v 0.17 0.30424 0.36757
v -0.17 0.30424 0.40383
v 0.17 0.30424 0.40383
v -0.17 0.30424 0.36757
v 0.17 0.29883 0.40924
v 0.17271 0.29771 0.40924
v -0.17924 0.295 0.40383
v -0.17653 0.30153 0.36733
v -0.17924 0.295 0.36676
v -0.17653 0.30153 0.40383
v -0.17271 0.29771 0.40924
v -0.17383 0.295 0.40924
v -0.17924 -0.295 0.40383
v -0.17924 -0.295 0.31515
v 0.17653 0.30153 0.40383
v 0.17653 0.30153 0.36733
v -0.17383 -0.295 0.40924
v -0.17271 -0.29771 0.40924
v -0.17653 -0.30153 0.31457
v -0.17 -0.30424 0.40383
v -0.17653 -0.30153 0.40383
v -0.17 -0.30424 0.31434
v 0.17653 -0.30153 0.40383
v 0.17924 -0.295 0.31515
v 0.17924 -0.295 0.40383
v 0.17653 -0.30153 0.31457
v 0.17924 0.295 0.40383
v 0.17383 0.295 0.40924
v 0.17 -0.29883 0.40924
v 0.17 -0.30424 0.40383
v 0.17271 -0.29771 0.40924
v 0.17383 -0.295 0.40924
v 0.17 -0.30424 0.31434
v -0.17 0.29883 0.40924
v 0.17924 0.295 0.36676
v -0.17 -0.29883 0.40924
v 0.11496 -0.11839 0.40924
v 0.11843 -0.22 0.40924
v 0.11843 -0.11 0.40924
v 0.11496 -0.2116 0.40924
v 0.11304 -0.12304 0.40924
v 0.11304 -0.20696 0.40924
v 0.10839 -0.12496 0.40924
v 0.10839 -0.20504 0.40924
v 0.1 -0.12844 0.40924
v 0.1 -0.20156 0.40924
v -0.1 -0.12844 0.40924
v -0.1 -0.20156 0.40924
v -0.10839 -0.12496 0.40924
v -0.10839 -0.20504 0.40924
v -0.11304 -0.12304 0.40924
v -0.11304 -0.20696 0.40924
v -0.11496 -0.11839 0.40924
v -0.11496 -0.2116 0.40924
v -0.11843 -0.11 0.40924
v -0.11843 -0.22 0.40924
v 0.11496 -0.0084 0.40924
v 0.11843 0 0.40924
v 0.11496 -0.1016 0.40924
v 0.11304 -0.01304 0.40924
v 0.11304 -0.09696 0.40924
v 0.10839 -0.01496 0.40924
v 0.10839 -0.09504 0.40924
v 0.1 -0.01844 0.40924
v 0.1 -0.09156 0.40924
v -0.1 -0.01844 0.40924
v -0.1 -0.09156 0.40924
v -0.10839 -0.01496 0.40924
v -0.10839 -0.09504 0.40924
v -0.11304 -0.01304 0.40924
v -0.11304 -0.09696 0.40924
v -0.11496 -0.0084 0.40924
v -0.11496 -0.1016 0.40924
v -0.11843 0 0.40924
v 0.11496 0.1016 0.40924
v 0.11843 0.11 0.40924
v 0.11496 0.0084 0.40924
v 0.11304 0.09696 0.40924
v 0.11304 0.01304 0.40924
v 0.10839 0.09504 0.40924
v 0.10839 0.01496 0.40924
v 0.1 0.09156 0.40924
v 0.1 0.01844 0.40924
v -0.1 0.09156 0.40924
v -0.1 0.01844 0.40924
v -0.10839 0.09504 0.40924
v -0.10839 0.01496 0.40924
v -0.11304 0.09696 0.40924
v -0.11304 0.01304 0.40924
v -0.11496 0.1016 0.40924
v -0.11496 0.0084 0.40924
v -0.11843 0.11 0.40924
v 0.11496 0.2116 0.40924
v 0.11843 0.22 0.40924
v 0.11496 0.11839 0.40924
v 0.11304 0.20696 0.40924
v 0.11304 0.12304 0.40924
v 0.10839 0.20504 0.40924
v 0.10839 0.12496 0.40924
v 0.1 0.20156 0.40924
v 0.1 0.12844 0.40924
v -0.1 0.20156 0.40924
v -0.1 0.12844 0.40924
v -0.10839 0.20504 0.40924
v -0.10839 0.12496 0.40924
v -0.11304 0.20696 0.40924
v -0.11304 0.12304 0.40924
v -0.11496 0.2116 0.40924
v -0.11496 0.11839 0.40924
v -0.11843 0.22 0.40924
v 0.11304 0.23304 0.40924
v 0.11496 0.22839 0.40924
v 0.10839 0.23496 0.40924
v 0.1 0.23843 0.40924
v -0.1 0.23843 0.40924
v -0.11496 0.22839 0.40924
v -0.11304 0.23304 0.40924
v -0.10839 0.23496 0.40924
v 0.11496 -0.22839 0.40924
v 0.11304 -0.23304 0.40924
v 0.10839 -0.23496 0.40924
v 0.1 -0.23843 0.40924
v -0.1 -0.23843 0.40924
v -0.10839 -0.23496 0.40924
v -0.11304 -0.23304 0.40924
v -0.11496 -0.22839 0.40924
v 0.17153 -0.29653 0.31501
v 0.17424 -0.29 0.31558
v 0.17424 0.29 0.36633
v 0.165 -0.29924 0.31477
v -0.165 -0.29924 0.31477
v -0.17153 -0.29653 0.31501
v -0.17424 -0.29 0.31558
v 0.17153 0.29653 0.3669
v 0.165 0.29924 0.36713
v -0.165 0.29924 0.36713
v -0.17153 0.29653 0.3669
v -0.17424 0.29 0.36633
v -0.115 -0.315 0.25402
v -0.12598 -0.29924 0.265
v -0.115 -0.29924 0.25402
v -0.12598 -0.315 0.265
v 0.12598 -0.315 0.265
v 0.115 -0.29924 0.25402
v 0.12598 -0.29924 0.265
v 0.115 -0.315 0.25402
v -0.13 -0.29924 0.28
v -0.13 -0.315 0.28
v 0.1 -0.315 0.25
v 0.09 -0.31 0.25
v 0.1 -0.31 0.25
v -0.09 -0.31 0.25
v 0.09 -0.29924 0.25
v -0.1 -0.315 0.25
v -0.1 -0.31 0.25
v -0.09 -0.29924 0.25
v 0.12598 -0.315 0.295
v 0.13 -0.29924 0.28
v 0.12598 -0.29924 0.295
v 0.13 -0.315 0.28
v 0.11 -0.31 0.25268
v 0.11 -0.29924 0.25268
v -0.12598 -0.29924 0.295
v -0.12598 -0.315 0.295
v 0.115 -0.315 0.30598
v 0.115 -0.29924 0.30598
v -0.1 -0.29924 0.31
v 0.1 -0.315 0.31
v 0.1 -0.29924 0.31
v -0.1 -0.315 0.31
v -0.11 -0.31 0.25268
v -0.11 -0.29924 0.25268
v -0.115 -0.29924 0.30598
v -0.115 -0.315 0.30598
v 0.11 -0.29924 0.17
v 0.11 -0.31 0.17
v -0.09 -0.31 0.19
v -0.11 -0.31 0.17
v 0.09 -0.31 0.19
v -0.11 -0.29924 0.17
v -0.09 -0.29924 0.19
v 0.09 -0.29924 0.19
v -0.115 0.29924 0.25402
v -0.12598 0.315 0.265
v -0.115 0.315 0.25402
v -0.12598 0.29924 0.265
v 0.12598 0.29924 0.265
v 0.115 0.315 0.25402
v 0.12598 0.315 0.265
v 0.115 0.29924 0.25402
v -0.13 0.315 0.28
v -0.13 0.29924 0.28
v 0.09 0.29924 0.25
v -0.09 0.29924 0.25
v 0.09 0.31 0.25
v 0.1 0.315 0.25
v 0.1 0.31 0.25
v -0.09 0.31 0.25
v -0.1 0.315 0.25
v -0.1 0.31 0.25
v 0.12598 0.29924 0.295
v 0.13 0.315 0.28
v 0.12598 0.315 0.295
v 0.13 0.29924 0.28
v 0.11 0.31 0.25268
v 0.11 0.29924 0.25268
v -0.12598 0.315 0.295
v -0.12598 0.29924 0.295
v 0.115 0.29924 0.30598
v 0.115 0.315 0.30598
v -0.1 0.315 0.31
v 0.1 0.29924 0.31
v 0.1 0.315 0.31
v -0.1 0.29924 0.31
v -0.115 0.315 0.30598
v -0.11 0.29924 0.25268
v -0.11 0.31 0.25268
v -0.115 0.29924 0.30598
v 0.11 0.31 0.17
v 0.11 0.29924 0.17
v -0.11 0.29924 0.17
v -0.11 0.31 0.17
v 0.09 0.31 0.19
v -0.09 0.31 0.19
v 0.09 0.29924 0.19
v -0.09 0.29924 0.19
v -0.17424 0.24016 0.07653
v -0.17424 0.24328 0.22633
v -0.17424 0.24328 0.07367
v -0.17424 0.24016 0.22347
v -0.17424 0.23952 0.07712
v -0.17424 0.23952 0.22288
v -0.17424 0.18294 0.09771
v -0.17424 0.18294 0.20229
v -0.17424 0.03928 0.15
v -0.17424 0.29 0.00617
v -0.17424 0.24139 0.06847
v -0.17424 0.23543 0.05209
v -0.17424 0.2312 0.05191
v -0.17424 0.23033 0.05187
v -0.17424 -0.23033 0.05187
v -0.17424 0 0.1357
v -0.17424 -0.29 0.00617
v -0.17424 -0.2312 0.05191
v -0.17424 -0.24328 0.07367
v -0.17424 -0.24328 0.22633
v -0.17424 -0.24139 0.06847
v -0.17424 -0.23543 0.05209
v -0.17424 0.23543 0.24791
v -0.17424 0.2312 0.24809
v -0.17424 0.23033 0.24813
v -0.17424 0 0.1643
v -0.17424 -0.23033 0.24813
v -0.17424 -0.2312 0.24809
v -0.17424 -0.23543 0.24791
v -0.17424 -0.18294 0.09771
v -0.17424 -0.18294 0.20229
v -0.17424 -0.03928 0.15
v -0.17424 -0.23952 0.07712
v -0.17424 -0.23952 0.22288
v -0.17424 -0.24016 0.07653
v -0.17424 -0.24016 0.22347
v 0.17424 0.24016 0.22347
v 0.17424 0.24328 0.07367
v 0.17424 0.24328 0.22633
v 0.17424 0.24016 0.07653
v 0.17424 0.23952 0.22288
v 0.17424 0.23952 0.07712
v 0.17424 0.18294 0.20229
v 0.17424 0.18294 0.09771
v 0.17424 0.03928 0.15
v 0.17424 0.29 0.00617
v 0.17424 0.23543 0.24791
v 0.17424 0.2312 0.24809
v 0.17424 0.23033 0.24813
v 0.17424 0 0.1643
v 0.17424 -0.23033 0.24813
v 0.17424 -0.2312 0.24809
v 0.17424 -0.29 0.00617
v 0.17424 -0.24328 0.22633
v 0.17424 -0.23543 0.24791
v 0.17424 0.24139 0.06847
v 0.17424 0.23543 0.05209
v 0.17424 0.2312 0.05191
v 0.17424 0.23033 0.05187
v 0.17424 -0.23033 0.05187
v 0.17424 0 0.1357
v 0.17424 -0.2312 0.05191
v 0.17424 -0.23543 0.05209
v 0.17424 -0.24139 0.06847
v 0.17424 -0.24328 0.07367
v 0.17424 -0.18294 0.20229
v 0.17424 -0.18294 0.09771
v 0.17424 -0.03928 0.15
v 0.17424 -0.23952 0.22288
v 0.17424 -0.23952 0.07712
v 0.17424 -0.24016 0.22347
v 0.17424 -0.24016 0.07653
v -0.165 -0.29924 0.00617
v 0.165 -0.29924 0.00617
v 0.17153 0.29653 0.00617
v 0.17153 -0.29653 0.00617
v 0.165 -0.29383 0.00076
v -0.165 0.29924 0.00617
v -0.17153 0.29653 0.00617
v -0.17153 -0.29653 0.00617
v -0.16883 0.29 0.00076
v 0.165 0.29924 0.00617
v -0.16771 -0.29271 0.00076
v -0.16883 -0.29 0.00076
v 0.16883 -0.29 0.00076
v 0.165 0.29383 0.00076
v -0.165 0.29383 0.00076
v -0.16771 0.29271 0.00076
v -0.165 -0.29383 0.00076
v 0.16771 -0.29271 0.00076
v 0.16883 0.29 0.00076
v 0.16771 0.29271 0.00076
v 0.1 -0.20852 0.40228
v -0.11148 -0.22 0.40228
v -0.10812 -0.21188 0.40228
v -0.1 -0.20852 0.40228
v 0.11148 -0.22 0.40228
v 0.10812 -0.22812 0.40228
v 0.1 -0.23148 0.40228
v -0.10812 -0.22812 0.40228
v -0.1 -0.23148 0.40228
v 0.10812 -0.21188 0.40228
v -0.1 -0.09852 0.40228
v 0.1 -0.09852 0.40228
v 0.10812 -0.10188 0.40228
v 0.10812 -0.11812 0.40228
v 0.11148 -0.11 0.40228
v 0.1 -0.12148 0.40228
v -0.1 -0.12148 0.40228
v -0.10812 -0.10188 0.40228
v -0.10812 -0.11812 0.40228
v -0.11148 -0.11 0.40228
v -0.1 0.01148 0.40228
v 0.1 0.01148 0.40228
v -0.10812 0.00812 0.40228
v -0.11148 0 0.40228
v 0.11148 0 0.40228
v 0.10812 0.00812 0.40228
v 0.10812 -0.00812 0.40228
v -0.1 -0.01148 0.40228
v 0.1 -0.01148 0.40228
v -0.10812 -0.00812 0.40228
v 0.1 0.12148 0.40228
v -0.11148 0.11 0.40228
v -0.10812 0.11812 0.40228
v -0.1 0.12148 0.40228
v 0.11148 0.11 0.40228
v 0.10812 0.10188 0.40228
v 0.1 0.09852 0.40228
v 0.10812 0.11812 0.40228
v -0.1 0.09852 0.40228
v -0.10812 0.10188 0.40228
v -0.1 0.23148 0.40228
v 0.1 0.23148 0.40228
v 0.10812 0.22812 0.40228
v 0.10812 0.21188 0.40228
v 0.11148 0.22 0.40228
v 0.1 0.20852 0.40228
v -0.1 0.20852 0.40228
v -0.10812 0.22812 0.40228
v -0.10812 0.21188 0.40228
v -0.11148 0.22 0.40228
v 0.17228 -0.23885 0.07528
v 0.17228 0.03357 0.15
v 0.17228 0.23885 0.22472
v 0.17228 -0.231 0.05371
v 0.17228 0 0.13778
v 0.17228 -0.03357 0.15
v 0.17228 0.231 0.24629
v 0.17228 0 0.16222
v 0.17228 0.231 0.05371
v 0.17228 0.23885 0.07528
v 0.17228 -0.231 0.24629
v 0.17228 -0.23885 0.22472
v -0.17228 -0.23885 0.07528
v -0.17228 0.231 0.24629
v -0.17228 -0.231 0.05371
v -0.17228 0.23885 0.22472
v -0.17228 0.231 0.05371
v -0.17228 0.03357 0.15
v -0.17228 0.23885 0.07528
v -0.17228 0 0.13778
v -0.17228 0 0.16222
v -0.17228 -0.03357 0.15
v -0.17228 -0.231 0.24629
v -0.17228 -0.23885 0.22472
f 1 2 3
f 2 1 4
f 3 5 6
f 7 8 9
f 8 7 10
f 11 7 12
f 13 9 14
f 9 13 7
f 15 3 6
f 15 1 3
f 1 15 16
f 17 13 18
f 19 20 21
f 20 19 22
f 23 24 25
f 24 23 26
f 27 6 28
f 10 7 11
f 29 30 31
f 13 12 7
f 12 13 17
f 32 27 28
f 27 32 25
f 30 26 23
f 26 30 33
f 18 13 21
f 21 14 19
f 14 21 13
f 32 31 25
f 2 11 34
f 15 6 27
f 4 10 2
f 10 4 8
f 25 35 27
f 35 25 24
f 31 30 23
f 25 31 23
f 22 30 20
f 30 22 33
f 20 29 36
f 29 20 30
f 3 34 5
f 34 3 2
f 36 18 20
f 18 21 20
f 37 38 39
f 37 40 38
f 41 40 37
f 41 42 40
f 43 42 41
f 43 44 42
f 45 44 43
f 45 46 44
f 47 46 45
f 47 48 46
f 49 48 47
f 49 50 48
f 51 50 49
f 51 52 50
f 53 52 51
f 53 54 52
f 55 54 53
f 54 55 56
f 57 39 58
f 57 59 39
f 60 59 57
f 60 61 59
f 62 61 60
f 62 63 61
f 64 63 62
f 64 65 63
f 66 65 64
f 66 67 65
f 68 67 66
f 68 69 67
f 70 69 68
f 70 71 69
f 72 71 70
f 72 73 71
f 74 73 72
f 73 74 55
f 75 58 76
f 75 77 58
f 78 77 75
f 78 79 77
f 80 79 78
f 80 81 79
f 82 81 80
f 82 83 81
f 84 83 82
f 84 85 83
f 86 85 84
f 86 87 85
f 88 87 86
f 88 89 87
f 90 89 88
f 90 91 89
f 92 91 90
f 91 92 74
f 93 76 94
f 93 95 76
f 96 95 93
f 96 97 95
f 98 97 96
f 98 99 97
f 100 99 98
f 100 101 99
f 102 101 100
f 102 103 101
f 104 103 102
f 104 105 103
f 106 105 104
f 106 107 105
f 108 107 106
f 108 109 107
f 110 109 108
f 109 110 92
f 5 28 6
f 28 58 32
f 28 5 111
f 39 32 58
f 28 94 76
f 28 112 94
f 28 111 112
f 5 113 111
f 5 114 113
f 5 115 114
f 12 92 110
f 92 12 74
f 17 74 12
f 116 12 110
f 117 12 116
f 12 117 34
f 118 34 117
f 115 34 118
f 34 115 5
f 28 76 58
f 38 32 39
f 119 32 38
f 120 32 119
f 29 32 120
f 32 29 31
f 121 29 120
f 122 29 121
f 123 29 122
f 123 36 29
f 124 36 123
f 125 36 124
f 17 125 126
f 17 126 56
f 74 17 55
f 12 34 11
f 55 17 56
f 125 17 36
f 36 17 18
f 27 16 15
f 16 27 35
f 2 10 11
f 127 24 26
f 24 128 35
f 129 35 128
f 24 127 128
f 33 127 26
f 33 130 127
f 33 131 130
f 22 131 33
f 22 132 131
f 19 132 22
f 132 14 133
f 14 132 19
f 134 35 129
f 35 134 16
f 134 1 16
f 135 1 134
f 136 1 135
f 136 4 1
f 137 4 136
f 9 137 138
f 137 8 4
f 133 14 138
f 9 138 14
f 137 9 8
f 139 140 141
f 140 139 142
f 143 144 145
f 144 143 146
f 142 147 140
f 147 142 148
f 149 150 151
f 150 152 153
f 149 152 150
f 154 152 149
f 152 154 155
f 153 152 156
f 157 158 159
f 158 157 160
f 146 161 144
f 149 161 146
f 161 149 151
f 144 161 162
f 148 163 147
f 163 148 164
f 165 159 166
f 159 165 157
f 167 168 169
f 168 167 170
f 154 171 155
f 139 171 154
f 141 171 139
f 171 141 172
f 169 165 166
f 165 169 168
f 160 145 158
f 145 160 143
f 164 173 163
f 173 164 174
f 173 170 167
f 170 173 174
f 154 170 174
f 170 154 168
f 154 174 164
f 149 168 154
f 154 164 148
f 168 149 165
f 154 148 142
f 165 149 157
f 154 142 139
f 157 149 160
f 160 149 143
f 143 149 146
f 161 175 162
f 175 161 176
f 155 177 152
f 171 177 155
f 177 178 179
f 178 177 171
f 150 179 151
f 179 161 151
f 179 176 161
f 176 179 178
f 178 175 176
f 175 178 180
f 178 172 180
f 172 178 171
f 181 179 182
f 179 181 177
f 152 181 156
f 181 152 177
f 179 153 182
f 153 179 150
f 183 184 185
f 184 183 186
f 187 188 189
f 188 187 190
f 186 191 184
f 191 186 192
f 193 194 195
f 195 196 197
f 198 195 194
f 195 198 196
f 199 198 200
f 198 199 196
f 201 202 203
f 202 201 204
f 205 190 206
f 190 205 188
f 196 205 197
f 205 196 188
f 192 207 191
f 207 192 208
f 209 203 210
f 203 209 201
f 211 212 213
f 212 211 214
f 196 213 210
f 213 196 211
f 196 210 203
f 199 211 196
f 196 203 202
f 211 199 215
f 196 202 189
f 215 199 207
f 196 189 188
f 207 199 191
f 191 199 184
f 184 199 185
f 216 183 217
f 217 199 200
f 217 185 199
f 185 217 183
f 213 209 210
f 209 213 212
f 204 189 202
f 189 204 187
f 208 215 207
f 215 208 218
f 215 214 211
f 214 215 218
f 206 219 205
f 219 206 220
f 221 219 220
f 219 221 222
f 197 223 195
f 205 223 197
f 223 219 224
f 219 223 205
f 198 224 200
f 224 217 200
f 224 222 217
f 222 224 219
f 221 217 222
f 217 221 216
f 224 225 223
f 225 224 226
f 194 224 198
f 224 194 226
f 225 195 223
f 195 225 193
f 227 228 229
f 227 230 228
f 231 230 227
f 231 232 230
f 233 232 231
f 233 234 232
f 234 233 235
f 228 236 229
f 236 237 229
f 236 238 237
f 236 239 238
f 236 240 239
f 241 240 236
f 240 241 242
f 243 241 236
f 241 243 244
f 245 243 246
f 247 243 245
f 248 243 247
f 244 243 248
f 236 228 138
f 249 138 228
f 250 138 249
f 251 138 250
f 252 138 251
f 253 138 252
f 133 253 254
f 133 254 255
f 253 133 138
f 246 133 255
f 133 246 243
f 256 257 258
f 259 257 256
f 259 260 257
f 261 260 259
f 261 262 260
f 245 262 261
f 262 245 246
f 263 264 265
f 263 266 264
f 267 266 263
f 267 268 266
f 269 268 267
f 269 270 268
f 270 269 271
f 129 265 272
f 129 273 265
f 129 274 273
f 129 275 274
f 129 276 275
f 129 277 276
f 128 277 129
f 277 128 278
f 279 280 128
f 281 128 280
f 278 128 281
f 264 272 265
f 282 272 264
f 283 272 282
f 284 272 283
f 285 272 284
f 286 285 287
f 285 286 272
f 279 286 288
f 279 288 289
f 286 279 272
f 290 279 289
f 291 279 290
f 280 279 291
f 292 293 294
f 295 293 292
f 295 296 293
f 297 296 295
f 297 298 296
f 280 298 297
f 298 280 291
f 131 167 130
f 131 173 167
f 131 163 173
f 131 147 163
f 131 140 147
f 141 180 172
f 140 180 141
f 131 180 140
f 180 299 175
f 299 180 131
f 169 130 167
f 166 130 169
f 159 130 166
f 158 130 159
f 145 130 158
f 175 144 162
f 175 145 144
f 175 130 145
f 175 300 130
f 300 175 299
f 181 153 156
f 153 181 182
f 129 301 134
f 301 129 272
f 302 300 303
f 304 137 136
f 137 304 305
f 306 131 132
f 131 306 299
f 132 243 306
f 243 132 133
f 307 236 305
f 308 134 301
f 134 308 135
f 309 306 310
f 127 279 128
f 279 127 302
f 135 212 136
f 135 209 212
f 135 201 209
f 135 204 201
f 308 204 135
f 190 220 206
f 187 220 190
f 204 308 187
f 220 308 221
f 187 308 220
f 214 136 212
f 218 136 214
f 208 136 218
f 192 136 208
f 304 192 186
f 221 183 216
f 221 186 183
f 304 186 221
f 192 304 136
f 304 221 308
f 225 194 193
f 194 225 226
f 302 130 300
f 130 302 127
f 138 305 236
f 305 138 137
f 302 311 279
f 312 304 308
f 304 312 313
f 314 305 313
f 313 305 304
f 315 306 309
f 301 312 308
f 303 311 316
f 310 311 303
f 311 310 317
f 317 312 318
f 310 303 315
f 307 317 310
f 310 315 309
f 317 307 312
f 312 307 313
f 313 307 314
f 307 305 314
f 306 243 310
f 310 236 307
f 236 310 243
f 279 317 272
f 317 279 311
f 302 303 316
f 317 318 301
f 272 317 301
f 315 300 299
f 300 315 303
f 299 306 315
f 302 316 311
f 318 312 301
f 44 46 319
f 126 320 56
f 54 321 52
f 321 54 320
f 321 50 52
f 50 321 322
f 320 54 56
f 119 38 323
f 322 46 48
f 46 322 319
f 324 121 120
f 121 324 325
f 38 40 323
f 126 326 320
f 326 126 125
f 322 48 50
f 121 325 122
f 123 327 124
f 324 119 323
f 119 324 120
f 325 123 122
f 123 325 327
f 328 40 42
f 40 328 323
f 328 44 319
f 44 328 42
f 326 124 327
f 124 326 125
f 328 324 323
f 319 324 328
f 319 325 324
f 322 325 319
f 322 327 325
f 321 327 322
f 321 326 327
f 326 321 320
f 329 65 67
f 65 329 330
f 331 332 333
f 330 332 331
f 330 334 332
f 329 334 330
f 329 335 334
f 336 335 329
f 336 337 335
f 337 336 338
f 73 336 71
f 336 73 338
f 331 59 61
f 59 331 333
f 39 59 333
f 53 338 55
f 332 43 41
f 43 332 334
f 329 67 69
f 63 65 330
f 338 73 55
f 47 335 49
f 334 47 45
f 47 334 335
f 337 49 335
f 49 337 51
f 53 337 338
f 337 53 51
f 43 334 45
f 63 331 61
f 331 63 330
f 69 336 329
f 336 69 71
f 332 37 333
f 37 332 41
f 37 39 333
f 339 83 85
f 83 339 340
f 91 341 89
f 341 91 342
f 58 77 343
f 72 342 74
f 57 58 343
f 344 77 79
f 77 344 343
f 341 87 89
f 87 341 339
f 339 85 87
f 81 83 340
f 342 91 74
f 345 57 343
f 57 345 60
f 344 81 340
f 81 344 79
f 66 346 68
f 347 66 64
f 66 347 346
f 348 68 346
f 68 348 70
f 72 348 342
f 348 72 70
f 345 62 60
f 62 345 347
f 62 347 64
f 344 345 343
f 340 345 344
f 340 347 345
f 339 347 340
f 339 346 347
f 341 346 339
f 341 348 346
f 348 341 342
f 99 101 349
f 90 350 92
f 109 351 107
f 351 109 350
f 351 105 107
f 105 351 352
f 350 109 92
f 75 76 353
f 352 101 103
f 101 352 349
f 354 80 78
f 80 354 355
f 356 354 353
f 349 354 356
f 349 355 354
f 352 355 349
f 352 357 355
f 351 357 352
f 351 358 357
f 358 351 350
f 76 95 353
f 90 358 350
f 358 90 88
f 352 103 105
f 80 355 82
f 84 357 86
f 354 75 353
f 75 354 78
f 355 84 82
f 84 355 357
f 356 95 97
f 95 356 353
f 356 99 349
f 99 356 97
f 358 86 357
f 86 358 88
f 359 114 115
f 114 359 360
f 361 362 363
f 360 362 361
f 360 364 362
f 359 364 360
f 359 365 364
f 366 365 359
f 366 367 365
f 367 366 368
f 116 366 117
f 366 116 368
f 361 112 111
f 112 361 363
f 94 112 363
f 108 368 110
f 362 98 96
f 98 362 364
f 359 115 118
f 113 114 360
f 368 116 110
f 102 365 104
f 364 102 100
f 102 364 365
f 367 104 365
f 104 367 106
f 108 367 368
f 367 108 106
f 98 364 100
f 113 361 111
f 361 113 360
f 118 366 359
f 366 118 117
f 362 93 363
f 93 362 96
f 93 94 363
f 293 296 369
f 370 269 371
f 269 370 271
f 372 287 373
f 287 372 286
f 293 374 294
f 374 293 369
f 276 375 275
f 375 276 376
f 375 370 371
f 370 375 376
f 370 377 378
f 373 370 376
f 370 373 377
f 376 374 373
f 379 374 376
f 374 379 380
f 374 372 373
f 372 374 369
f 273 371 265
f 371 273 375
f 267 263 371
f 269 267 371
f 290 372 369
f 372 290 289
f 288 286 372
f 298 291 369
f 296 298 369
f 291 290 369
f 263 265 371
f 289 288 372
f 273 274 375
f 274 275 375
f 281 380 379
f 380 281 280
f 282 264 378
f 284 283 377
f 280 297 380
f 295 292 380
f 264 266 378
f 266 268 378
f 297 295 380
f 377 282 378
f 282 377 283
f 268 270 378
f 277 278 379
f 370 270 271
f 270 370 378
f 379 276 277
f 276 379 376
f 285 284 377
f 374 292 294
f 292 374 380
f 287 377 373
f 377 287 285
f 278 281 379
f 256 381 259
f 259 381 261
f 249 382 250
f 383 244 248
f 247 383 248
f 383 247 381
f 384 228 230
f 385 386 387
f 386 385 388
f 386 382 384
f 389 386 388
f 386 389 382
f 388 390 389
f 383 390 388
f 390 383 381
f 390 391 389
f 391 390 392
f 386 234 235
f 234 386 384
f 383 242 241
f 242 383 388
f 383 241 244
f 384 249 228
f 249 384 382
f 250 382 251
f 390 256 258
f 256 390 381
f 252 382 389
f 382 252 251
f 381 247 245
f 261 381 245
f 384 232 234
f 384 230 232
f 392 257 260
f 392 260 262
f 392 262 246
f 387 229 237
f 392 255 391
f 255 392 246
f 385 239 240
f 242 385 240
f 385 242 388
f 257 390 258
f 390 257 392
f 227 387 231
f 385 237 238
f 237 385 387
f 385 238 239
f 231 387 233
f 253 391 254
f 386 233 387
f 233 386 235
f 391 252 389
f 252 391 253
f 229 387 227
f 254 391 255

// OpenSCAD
use <lib.scad>

module handleHD() {
	union() {
		hull() {
			translate([-0.1,0,0]) rotate([90,0,0]) cyl(0.03, 0.03, 0.03, $fn=12);
			translate([0.1,0,0]) rotate([90,0,0]) cyl(0.03, 0.03, 0.03, $fn=12);
		}
		hull() {
			translate([-0.1,0,-0.1]) box([0.02,0.02,0.02]);
			translate([0.1,0,-0.1]) box([0.02,0.02,0.02]);
		}
		hull() {
			translate([-0.1,0,-0.1]) box([0.02,0.02,0.02]);
			translate([-0.1,0,0]) box([0.02,0.02,0.02]);
		}
		hull() {
			translate([0.1,0,-0.1]) box([0.02,0.02,0.02]);
			translate([0.1,0,0]) box([0.02,0.02,0.02]);
		}
	}
}

module cutoutHD(len) {
	hull() {
		translate([-len/2,0,0]) sphere(r=0.03,$fn=8);
		translate([len/2,0,0]) sphere(r=0.03,$fn=8);
	}
}

module ammoHD() {
	translate([0,0,0.2]) difference() {
		union() {
			rbox([0.35, 0.6, 0.4], 0.01, $fn=8);
			translate([0,0,-0.04]) difference() {
				rbox([0.36, 0.61, 0.5], 0.01, $fn=8);
				translate([0,0,-0.07]) rotate([5,0,0]) box([0.42, 1, 0.5]);
			}
			translate([0,-0.3,0.08]) handleHD();
			translate([0,0.3,0.08]) handleHD();
		}

		translate([0.2,0,-0.05]) rotate([20,0,0]) rotate([0,0,90]) cutoutHD(0.5);
		translate([0.2,0,-0.05]) rotate([-20,0,0]) rotate([0,0,90]) cutoutHD(0.5);
		translate([-0.2,0,-0.05]) rotate([20,0,0]) rotate([0,0,90]) cutoutHD(0.5);
		translate([-0.2,0,-0.05]) rotate([-20,0,0]) rotate([0,0,90]) cutoutHD(0.5);

		for (i = [-2:1:2])
			translate([0,i*0.11,0.23]) cutoutHD(0.2);
	}
}

module ammoLD() {
	translate([0,0,0.2]) difference() box([0.35, 0.6, 0.4]);
}

ammoHD();
//ammoLD();
